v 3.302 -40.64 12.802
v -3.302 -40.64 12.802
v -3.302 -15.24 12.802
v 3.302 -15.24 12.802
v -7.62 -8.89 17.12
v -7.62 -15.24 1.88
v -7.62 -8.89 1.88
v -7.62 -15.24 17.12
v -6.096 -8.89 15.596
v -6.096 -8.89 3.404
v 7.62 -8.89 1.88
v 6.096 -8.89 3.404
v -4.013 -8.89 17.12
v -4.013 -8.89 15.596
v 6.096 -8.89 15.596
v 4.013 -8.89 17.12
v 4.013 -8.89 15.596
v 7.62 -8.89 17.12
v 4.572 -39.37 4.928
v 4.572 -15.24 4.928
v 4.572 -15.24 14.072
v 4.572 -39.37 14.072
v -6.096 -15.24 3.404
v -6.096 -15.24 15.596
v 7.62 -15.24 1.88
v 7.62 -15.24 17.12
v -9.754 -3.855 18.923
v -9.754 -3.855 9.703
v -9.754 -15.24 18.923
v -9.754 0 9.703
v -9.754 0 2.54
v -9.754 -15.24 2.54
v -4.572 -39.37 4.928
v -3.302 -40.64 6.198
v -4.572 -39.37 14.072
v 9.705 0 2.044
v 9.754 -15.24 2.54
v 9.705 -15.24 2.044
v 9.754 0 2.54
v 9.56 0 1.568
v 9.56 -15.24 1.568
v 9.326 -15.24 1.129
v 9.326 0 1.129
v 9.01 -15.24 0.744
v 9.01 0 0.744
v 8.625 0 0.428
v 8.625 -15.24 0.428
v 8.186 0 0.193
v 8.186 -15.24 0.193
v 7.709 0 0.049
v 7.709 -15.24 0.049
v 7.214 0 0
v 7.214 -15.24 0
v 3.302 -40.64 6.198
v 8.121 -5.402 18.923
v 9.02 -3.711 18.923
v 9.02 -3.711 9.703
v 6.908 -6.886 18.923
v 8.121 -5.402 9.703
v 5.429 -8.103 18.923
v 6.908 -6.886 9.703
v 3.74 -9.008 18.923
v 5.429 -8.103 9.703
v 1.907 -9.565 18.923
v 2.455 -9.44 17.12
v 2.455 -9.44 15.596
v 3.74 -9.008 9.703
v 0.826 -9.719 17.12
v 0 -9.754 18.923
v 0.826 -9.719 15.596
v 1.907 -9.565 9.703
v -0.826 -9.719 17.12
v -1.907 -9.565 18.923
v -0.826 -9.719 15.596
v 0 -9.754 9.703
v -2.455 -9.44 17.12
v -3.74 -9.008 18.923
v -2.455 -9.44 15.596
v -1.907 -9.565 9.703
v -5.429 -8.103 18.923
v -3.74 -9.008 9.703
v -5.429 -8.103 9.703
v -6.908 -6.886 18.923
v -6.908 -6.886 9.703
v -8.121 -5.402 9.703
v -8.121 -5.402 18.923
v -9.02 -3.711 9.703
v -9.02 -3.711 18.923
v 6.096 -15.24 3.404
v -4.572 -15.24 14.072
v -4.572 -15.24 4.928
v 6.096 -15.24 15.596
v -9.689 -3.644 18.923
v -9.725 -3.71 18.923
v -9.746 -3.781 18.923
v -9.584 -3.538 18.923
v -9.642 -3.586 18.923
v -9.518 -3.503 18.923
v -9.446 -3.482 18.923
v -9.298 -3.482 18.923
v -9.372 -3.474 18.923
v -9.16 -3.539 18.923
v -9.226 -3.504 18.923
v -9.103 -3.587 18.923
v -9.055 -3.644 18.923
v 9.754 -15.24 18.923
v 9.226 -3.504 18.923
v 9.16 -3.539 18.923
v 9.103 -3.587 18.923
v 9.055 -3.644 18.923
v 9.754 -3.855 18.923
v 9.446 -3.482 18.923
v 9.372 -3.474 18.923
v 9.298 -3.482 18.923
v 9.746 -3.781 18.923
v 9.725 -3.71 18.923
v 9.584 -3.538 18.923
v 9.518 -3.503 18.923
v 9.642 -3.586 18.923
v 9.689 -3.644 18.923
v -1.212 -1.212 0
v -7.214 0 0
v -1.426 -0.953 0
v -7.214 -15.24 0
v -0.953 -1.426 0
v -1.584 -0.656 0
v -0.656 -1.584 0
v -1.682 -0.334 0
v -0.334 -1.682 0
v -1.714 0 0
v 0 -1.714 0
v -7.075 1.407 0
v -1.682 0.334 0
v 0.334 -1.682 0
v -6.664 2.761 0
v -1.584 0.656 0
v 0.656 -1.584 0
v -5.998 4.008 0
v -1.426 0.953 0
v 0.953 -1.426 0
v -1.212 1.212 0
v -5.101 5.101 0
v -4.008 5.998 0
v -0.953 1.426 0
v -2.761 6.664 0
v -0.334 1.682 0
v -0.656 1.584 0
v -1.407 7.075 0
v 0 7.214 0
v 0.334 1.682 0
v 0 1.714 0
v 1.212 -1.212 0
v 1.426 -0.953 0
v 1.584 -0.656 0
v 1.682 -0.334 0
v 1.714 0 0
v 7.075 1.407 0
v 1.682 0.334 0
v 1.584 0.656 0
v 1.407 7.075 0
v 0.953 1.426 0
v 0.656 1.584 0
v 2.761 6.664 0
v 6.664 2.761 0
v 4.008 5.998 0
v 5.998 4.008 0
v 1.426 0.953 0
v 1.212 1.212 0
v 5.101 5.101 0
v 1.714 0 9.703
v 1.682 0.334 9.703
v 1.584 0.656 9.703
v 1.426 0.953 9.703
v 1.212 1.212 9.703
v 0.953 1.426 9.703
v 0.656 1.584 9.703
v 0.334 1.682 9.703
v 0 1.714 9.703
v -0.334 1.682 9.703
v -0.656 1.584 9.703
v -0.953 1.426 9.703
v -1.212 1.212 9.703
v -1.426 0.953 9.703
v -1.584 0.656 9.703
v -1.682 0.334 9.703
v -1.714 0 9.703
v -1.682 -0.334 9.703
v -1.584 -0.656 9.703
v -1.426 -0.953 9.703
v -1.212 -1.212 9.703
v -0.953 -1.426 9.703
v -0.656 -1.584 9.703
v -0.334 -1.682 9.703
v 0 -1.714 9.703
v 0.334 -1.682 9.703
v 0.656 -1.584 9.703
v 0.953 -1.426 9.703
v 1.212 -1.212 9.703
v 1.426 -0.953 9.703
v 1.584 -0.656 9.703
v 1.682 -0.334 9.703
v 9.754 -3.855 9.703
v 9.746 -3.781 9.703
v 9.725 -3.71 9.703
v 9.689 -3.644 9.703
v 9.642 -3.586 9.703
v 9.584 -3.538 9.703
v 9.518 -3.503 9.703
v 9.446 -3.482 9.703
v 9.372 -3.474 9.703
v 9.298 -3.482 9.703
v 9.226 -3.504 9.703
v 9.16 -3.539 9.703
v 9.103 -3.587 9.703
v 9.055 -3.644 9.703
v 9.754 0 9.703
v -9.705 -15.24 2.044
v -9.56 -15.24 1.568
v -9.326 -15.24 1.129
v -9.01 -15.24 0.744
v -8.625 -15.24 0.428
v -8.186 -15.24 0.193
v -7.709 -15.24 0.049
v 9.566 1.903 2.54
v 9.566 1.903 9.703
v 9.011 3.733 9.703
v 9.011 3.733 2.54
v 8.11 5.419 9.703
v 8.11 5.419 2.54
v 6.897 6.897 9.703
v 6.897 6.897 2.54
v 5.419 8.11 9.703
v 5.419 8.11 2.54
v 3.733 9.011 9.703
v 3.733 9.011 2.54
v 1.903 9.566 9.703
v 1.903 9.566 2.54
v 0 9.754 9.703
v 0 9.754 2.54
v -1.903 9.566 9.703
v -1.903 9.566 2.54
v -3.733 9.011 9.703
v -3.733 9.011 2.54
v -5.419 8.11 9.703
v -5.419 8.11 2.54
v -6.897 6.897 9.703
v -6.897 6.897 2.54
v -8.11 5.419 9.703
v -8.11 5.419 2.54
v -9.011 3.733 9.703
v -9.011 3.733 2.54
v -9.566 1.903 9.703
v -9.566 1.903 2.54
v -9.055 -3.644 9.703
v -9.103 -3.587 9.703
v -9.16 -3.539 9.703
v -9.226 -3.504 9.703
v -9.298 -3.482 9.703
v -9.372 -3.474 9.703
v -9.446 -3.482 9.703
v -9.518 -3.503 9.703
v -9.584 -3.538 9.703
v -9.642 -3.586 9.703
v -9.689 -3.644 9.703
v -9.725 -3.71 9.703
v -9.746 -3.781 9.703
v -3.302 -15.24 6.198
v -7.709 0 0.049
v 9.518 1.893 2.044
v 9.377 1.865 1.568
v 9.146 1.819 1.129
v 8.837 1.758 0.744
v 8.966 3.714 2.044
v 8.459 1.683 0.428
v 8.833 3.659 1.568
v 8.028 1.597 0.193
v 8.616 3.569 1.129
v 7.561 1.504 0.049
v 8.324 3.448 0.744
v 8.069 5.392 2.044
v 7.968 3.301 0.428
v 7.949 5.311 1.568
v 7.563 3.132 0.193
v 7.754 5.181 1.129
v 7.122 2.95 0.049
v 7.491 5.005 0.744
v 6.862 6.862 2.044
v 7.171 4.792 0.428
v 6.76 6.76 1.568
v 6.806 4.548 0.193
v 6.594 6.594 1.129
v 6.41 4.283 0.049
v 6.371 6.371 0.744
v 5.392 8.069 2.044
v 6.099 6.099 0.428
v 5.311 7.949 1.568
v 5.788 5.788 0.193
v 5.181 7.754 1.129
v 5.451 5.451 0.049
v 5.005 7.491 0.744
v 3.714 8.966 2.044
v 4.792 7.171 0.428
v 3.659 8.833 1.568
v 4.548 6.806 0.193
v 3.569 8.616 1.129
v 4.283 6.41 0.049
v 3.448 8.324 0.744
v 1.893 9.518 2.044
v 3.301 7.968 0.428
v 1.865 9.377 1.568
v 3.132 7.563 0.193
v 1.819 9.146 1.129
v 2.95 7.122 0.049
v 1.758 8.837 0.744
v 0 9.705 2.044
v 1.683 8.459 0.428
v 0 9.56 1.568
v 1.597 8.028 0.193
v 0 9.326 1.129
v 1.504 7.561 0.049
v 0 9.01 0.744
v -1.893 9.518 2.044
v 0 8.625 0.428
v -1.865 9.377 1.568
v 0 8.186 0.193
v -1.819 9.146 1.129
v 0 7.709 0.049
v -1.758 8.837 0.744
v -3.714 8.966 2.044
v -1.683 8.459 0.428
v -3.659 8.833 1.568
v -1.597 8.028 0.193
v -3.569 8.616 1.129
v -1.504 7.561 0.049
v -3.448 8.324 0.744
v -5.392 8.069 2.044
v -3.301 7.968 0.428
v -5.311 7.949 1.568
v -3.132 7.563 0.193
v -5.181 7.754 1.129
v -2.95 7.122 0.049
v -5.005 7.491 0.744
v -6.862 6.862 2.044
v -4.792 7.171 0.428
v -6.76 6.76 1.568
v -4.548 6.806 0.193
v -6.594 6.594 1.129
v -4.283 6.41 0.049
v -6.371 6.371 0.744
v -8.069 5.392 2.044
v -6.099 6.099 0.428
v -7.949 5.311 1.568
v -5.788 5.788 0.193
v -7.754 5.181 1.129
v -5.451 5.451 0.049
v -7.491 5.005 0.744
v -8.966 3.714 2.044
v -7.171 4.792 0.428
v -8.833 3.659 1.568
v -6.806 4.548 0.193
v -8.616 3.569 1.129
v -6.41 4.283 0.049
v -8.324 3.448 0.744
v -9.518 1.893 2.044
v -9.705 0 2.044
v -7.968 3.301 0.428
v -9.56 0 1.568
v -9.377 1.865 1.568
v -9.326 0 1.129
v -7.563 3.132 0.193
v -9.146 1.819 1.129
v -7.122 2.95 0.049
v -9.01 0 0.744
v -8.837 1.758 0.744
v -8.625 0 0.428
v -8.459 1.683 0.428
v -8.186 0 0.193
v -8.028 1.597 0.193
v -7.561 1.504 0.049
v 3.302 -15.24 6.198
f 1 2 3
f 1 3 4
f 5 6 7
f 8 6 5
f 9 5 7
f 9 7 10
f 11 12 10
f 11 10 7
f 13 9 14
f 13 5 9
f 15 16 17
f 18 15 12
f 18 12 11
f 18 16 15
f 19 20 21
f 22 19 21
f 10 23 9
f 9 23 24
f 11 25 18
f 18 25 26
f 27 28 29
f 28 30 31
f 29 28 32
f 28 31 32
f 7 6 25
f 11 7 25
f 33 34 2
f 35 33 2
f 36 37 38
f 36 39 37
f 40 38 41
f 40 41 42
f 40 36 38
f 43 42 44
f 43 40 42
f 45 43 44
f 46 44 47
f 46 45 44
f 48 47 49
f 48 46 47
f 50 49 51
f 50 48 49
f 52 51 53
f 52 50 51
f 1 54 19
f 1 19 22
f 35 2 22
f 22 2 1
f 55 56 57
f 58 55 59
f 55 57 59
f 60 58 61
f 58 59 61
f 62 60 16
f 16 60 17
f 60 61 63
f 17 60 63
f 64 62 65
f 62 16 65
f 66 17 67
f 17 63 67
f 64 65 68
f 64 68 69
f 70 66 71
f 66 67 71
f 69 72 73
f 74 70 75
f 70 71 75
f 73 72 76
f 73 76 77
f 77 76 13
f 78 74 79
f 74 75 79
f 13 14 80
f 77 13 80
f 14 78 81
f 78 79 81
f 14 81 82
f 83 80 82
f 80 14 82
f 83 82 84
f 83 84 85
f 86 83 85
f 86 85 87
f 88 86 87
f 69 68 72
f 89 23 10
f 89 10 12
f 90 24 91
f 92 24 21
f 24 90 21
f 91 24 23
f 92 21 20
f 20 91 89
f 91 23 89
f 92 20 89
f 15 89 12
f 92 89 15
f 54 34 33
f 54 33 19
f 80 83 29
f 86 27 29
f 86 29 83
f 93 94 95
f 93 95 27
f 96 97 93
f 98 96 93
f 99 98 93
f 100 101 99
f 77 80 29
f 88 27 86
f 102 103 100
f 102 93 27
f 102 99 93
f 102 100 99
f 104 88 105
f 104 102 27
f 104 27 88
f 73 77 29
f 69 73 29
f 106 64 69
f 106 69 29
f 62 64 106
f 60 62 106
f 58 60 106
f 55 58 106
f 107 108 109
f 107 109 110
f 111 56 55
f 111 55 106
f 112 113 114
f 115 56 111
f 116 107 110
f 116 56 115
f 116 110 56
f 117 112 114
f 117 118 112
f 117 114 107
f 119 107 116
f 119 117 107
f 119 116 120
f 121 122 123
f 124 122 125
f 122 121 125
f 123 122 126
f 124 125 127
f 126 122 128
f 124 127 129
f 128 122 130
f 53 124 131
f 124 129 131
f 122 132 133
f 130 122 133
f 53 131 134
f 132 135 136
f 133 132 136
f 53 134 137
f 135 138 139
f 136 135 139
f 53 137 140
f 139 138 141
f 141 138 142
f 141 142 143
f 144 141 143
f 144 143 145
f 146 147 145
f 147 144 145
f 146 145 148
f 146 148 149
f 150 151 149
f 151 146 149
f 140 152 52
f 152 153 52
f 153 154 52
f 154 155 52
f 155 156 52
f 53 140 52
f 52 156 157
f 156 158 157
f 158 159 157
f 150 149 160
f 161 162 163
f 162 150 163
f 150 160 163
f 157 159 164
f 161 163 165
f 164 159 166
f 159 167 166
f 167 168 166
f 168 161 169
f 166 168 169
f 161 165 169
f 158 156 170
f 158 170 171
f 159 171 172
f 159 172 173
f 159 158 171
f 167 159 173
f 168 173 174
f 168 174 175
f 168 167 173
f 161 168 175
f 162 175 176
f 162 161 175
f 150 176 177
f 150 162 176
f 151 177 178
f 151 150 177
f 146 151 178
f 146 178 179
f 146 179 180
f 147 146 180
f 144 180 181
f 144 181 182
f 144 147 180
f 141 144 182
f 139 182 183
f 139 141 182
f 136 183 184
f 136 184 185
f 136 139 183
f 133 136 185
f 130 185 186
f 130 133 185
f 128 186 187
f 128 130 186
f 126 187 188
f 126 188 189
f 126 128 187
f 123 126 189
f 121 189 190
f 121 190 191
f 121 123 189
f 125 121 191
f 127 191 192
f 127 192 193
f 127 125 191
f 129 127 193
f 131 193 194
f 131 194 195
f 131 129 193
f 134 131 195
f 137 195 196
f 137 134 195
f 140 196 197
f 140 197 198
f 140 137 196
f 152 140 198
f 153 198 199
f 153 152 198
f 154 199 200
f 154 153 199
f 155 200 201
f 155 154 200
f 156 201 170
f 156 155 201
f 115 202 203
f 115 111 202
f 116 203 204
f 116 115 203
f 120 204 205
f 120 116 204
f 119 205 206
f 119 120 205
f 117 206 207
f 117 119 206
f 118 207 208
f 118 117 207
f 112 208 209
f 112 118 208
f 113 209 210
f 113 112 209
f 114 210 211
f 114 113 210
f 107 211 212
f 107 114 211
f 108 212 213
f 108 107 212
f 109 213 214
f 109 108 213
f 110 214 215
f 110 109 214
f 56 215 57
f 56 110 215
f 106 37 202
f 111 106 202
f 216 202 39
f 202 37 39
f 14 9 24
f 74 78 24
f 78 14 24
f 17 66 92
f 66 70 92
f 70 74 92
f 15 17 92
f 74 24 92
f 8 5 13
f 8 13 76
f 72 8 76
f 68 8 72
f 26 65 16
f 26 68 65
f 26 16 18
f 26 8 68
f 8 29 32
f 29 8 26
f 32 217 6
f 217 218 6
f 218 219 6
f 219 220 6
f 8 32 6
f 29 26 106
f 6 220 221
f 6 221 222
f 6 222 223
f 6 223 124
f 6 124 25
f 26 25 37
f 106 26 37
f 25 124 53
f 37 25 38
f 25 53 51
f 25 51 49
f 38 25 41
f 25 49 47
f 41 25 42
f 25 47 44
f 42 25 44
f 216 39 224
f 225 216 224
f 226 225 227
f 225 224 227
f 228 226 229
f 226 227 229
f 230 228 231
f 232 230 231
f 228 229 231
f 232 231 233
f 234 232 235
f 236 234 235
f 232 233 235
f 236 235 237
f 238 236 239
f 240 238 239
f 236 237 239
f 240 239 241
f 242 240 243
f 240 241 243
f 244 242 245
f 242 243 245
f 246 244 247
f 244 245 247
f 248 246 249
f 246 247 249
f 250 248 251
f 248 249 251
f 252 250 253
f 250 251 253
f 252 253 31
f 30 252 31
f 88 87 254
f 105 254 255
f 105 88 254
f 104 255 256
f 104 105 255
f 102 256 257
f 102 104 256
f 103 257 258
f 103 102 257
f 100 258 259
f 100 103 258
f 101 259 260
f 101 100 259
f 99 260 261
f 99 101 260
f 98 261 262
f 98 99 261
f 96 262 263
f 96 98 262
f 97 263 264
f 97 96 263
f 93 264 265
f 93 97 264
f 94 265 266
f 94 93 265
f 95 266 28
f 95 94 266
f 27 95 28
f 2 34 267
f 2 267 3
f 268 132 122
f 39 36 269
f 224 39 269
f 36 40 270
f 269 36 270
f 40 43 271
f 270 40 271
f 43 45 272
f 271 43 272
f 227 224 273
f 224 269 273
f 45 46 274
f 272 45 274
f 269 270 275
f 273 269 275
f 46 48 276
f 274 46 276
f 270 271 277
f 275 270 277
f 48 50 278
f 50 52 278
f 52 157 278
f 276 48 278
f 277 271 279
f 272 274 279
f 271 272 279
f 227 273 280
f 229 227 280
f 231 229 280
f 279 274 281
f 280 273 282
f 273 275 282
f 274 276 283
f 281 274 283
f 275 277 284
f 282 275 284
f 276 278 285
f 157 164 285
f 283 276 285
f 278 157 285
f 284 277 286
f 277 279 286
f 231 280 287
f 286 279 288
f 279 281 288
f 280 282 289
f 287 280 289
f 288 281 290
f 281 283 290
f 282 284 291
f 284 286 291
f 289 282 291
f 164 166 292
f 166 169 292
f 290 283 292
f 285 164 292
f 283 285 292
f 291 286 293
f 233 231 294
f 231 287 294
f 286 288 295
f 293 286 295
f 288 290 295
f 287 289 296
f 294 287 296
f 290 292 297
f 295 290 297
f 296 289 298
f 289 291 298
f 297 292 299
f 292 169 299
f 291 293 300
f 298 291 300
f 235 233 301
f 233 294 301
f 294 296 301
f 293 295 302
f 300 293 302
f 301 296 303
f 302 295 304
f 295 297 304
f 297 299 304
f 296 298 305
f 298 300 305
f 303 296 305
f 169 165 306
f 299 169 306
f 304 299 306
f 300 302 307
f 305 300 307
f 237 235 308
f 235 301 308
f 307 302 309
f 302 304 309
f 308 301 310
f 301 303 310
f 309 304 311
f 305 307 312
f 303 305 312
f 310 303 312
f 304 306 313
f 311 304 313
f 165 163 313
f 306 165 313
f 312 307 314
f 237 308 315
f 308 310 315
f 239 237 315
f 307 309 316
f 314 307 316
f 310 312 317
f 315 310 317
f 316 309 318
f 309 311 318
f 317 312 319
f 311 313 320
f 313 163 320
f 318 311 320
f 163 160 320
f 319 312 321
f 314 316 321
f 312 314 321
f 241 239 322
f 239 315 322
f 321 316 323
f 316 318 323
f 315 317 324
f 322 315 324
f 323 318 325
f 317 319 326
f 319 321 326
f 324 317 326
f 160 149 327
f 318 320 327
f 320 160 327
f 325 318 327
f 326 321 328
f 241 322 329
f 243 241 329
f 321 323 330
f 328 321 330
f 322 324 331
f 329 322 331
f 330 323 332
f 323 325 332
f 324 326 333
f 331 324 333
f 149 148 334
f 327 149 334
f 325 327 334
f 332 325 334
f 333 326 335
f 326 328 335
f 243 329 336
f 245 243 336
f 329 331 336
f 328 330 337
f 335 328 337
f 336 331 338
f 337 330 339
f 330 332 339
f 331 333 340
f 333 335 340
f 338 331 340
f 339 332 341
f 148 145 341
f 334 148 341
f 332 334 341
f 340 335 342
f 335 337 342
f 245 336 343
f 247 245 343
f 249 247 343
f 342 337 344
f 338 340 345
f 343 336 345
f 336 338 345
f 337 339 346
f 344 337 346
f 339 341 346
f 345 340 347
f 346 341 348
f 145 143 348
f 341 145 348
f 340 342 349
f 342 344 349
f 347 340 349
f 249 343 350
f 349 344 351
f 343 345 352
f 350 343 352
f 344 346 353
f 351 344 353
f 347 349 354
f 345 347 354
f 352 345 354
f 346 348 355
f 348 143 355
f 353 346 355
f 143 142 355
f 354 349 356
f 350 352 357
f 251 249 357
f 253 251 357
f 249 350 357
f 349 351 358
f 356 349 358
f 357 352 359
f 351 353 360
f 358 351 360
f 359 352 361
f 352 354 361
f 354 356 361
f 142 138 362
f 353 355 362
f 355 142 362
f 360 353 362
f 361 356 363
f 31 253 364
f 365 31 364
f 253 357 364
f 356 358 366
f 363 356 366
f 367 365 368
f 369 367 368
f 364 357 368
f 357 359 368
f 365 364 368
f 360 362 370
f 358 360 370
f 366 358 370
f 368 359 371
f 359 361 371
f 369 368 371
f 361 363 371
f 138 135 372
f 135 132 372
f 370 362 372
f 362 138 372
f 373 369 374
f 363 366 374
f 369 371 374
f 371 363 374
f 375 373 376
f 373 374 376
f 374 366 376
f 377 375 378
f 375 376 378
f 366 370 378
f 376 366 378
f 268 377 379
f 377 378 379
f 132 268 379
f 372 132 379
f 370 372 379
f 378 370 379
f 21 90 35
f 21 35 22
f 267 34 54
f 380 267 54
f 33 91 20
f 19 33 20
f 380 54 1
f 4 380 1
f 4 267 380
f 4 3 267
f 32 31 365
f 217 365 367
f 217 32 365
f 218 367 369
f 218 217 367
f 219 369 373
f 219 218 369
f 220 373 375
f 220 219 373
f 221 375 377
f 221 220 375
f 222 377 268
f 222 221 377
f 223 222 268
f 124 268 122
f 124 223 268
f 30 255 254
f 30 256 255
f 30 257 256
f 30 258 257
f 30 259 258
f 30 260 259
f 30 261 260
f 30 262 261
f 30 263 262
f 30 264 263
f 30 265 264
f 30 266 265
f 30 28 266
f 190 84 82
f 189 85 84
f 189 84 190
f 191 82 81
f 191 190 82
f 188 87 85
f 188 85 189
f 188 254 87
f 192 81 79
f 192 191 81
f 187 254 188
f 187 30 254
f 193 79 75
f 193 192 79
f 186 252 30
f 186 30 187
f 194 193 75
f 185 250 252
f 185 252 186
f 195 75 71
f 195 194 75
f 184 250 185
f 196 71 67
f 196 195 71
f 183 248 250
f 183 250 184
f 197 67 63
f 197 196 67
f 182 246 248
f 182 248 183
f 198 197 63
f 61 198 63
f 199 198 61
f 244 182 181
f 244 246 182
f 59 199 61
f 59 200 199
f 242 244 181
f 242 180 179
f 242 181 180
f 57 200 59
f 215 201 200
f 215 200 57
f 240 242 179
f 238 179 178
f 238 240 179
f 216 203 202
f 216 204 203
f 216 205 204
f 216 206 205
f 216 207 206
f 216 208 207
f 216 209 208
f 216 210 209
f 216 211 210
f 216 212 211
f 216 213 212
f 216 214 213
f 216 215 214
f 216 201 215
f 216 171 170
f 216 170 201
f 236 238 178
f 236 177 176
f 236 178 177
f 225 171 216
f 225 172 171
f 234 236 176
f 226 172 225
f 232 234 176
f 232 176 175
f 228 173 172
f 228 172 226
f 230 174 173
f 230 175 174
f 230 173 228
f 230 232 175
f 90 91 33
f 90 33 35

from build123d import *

# Parameters (mm, degrees)
F0_R     = 1.7145
F1_DEPTH = 9.7028
F2_DEPTH = 18.923
F3_F1_R  = 0.381
F3_F2_R  = 0.381
F4_W     = 9.144
F4_H     = 9.144
F5_DEPTH = 25.4
F6_SIZE  = 1.27
F8_DEPTH = 25.4
F4_W_2   = 15.24
F4_H_2   = 15.24
F4_W_3   = 12.192
F4_H_3   = 12.192
F9_DEPTH = 6.35
F10_R    = 2.54


with BuildPart() as f1:
    # F0 (on Top) → F1 (new body)
    with BuildSketch(Plane.XY):
        with BuildLine():
            ThreePointArc((-9.7536, 0), (0, -9.7536), (9.7536, 0))
            ThreePointArc((9.7536, 0), (0, 9.7536), (-9.7536, 0))
        make_face()
        Circle(F0_R, mode=Mode.SUBTRACT)
    extrude(amount=F1_DEPTH)

    # F0 (on Top) → F2 (join)
    with BuildSketch(Plane.XY):
        with BuildLine():
            Line((9.7536, -15.24), (9.7536, 0))
            ThreePointArc((9.7536, 0), (0, -9.7536), (-9.7536, 0))
            Line((-9.7536, 0), (-9.7536, -15.24))
            Line((-9.7536, -15.24), (9.7536, -15.24))
        make_face()
    extrude(amount=F2_DEPTH)

    # F3: fillet of radius 0.381 on 3 edges, made by hand

    # F3_f1
    f3_f1_edges = [f1.edges().sort_by_distance(p)[0] for p in [
        (9.7536, 0, 14.3129),
    ]]
    fillet(f3_f1_edges, radius=F3_F1_R)

    # F3_f2
    f3_f2_edges = [f1.edges().sort_by_distance(p)[0] for p in [
        (-9.7536, 0, 14.3129),
    ]]
    fillet(f3_f2_edges, radius=F3_F2_R)

    # F4 (on face) → F5 (join)
    with BuildSketch(Plane.XZ.offset(15.24)):
        with Locations((0, 9.500099346)):
            Rectangle(F4_W, F4_H)
    extrude(amount=F5_DEPTH)

    # F6
    f6_edges = [f1.edges().sort_by_distance(p)[0] for p in [
        (0, -40.64, 4.928099),
        (4.572, -40.64, 9.500099),
        (0, -40.64, 14.072099),
        (-4.572, -40.64, 9.500099),
    ]]
    chamfer(f6_edges, length=F6_SIZE)

    # F8 (cut): a face of the model
    f8_faces = [f1.faces().sort_by_distance(p)[0] for p in [
        (0, -40.64, 9.500099346),
    ]]
    extrude(f8_faces, amount=-F8_DEPTH, mode=Mode.SUBTRACT)

    # F4 (on face) → F9 (cut)
    with BuildSketch(Plane.XZ.offset(15.24)):
        with Locations((0, 9.500099346)):
            Rectangle(F4_W_2, F4_H_2)
        with Locations((0, 9.500099346)):
            Rectangle(F4_W_3, F4_H_3, mode=Mode.SUBTRACT)
    extrude(amount=-F9_DEPTH, mode=Mode.SUBTRACT)

    # F10
    f10_edges = [f1.edges().sort_by_distance(p)[0] for p in [
        (0, 9.7536, 0),
        (9.7536, -7.62, 0),
        (-9.7536, -7.62, 0),
    ]]
    fillet(f10_edges, radius=F10_R)


solid = f1.part
